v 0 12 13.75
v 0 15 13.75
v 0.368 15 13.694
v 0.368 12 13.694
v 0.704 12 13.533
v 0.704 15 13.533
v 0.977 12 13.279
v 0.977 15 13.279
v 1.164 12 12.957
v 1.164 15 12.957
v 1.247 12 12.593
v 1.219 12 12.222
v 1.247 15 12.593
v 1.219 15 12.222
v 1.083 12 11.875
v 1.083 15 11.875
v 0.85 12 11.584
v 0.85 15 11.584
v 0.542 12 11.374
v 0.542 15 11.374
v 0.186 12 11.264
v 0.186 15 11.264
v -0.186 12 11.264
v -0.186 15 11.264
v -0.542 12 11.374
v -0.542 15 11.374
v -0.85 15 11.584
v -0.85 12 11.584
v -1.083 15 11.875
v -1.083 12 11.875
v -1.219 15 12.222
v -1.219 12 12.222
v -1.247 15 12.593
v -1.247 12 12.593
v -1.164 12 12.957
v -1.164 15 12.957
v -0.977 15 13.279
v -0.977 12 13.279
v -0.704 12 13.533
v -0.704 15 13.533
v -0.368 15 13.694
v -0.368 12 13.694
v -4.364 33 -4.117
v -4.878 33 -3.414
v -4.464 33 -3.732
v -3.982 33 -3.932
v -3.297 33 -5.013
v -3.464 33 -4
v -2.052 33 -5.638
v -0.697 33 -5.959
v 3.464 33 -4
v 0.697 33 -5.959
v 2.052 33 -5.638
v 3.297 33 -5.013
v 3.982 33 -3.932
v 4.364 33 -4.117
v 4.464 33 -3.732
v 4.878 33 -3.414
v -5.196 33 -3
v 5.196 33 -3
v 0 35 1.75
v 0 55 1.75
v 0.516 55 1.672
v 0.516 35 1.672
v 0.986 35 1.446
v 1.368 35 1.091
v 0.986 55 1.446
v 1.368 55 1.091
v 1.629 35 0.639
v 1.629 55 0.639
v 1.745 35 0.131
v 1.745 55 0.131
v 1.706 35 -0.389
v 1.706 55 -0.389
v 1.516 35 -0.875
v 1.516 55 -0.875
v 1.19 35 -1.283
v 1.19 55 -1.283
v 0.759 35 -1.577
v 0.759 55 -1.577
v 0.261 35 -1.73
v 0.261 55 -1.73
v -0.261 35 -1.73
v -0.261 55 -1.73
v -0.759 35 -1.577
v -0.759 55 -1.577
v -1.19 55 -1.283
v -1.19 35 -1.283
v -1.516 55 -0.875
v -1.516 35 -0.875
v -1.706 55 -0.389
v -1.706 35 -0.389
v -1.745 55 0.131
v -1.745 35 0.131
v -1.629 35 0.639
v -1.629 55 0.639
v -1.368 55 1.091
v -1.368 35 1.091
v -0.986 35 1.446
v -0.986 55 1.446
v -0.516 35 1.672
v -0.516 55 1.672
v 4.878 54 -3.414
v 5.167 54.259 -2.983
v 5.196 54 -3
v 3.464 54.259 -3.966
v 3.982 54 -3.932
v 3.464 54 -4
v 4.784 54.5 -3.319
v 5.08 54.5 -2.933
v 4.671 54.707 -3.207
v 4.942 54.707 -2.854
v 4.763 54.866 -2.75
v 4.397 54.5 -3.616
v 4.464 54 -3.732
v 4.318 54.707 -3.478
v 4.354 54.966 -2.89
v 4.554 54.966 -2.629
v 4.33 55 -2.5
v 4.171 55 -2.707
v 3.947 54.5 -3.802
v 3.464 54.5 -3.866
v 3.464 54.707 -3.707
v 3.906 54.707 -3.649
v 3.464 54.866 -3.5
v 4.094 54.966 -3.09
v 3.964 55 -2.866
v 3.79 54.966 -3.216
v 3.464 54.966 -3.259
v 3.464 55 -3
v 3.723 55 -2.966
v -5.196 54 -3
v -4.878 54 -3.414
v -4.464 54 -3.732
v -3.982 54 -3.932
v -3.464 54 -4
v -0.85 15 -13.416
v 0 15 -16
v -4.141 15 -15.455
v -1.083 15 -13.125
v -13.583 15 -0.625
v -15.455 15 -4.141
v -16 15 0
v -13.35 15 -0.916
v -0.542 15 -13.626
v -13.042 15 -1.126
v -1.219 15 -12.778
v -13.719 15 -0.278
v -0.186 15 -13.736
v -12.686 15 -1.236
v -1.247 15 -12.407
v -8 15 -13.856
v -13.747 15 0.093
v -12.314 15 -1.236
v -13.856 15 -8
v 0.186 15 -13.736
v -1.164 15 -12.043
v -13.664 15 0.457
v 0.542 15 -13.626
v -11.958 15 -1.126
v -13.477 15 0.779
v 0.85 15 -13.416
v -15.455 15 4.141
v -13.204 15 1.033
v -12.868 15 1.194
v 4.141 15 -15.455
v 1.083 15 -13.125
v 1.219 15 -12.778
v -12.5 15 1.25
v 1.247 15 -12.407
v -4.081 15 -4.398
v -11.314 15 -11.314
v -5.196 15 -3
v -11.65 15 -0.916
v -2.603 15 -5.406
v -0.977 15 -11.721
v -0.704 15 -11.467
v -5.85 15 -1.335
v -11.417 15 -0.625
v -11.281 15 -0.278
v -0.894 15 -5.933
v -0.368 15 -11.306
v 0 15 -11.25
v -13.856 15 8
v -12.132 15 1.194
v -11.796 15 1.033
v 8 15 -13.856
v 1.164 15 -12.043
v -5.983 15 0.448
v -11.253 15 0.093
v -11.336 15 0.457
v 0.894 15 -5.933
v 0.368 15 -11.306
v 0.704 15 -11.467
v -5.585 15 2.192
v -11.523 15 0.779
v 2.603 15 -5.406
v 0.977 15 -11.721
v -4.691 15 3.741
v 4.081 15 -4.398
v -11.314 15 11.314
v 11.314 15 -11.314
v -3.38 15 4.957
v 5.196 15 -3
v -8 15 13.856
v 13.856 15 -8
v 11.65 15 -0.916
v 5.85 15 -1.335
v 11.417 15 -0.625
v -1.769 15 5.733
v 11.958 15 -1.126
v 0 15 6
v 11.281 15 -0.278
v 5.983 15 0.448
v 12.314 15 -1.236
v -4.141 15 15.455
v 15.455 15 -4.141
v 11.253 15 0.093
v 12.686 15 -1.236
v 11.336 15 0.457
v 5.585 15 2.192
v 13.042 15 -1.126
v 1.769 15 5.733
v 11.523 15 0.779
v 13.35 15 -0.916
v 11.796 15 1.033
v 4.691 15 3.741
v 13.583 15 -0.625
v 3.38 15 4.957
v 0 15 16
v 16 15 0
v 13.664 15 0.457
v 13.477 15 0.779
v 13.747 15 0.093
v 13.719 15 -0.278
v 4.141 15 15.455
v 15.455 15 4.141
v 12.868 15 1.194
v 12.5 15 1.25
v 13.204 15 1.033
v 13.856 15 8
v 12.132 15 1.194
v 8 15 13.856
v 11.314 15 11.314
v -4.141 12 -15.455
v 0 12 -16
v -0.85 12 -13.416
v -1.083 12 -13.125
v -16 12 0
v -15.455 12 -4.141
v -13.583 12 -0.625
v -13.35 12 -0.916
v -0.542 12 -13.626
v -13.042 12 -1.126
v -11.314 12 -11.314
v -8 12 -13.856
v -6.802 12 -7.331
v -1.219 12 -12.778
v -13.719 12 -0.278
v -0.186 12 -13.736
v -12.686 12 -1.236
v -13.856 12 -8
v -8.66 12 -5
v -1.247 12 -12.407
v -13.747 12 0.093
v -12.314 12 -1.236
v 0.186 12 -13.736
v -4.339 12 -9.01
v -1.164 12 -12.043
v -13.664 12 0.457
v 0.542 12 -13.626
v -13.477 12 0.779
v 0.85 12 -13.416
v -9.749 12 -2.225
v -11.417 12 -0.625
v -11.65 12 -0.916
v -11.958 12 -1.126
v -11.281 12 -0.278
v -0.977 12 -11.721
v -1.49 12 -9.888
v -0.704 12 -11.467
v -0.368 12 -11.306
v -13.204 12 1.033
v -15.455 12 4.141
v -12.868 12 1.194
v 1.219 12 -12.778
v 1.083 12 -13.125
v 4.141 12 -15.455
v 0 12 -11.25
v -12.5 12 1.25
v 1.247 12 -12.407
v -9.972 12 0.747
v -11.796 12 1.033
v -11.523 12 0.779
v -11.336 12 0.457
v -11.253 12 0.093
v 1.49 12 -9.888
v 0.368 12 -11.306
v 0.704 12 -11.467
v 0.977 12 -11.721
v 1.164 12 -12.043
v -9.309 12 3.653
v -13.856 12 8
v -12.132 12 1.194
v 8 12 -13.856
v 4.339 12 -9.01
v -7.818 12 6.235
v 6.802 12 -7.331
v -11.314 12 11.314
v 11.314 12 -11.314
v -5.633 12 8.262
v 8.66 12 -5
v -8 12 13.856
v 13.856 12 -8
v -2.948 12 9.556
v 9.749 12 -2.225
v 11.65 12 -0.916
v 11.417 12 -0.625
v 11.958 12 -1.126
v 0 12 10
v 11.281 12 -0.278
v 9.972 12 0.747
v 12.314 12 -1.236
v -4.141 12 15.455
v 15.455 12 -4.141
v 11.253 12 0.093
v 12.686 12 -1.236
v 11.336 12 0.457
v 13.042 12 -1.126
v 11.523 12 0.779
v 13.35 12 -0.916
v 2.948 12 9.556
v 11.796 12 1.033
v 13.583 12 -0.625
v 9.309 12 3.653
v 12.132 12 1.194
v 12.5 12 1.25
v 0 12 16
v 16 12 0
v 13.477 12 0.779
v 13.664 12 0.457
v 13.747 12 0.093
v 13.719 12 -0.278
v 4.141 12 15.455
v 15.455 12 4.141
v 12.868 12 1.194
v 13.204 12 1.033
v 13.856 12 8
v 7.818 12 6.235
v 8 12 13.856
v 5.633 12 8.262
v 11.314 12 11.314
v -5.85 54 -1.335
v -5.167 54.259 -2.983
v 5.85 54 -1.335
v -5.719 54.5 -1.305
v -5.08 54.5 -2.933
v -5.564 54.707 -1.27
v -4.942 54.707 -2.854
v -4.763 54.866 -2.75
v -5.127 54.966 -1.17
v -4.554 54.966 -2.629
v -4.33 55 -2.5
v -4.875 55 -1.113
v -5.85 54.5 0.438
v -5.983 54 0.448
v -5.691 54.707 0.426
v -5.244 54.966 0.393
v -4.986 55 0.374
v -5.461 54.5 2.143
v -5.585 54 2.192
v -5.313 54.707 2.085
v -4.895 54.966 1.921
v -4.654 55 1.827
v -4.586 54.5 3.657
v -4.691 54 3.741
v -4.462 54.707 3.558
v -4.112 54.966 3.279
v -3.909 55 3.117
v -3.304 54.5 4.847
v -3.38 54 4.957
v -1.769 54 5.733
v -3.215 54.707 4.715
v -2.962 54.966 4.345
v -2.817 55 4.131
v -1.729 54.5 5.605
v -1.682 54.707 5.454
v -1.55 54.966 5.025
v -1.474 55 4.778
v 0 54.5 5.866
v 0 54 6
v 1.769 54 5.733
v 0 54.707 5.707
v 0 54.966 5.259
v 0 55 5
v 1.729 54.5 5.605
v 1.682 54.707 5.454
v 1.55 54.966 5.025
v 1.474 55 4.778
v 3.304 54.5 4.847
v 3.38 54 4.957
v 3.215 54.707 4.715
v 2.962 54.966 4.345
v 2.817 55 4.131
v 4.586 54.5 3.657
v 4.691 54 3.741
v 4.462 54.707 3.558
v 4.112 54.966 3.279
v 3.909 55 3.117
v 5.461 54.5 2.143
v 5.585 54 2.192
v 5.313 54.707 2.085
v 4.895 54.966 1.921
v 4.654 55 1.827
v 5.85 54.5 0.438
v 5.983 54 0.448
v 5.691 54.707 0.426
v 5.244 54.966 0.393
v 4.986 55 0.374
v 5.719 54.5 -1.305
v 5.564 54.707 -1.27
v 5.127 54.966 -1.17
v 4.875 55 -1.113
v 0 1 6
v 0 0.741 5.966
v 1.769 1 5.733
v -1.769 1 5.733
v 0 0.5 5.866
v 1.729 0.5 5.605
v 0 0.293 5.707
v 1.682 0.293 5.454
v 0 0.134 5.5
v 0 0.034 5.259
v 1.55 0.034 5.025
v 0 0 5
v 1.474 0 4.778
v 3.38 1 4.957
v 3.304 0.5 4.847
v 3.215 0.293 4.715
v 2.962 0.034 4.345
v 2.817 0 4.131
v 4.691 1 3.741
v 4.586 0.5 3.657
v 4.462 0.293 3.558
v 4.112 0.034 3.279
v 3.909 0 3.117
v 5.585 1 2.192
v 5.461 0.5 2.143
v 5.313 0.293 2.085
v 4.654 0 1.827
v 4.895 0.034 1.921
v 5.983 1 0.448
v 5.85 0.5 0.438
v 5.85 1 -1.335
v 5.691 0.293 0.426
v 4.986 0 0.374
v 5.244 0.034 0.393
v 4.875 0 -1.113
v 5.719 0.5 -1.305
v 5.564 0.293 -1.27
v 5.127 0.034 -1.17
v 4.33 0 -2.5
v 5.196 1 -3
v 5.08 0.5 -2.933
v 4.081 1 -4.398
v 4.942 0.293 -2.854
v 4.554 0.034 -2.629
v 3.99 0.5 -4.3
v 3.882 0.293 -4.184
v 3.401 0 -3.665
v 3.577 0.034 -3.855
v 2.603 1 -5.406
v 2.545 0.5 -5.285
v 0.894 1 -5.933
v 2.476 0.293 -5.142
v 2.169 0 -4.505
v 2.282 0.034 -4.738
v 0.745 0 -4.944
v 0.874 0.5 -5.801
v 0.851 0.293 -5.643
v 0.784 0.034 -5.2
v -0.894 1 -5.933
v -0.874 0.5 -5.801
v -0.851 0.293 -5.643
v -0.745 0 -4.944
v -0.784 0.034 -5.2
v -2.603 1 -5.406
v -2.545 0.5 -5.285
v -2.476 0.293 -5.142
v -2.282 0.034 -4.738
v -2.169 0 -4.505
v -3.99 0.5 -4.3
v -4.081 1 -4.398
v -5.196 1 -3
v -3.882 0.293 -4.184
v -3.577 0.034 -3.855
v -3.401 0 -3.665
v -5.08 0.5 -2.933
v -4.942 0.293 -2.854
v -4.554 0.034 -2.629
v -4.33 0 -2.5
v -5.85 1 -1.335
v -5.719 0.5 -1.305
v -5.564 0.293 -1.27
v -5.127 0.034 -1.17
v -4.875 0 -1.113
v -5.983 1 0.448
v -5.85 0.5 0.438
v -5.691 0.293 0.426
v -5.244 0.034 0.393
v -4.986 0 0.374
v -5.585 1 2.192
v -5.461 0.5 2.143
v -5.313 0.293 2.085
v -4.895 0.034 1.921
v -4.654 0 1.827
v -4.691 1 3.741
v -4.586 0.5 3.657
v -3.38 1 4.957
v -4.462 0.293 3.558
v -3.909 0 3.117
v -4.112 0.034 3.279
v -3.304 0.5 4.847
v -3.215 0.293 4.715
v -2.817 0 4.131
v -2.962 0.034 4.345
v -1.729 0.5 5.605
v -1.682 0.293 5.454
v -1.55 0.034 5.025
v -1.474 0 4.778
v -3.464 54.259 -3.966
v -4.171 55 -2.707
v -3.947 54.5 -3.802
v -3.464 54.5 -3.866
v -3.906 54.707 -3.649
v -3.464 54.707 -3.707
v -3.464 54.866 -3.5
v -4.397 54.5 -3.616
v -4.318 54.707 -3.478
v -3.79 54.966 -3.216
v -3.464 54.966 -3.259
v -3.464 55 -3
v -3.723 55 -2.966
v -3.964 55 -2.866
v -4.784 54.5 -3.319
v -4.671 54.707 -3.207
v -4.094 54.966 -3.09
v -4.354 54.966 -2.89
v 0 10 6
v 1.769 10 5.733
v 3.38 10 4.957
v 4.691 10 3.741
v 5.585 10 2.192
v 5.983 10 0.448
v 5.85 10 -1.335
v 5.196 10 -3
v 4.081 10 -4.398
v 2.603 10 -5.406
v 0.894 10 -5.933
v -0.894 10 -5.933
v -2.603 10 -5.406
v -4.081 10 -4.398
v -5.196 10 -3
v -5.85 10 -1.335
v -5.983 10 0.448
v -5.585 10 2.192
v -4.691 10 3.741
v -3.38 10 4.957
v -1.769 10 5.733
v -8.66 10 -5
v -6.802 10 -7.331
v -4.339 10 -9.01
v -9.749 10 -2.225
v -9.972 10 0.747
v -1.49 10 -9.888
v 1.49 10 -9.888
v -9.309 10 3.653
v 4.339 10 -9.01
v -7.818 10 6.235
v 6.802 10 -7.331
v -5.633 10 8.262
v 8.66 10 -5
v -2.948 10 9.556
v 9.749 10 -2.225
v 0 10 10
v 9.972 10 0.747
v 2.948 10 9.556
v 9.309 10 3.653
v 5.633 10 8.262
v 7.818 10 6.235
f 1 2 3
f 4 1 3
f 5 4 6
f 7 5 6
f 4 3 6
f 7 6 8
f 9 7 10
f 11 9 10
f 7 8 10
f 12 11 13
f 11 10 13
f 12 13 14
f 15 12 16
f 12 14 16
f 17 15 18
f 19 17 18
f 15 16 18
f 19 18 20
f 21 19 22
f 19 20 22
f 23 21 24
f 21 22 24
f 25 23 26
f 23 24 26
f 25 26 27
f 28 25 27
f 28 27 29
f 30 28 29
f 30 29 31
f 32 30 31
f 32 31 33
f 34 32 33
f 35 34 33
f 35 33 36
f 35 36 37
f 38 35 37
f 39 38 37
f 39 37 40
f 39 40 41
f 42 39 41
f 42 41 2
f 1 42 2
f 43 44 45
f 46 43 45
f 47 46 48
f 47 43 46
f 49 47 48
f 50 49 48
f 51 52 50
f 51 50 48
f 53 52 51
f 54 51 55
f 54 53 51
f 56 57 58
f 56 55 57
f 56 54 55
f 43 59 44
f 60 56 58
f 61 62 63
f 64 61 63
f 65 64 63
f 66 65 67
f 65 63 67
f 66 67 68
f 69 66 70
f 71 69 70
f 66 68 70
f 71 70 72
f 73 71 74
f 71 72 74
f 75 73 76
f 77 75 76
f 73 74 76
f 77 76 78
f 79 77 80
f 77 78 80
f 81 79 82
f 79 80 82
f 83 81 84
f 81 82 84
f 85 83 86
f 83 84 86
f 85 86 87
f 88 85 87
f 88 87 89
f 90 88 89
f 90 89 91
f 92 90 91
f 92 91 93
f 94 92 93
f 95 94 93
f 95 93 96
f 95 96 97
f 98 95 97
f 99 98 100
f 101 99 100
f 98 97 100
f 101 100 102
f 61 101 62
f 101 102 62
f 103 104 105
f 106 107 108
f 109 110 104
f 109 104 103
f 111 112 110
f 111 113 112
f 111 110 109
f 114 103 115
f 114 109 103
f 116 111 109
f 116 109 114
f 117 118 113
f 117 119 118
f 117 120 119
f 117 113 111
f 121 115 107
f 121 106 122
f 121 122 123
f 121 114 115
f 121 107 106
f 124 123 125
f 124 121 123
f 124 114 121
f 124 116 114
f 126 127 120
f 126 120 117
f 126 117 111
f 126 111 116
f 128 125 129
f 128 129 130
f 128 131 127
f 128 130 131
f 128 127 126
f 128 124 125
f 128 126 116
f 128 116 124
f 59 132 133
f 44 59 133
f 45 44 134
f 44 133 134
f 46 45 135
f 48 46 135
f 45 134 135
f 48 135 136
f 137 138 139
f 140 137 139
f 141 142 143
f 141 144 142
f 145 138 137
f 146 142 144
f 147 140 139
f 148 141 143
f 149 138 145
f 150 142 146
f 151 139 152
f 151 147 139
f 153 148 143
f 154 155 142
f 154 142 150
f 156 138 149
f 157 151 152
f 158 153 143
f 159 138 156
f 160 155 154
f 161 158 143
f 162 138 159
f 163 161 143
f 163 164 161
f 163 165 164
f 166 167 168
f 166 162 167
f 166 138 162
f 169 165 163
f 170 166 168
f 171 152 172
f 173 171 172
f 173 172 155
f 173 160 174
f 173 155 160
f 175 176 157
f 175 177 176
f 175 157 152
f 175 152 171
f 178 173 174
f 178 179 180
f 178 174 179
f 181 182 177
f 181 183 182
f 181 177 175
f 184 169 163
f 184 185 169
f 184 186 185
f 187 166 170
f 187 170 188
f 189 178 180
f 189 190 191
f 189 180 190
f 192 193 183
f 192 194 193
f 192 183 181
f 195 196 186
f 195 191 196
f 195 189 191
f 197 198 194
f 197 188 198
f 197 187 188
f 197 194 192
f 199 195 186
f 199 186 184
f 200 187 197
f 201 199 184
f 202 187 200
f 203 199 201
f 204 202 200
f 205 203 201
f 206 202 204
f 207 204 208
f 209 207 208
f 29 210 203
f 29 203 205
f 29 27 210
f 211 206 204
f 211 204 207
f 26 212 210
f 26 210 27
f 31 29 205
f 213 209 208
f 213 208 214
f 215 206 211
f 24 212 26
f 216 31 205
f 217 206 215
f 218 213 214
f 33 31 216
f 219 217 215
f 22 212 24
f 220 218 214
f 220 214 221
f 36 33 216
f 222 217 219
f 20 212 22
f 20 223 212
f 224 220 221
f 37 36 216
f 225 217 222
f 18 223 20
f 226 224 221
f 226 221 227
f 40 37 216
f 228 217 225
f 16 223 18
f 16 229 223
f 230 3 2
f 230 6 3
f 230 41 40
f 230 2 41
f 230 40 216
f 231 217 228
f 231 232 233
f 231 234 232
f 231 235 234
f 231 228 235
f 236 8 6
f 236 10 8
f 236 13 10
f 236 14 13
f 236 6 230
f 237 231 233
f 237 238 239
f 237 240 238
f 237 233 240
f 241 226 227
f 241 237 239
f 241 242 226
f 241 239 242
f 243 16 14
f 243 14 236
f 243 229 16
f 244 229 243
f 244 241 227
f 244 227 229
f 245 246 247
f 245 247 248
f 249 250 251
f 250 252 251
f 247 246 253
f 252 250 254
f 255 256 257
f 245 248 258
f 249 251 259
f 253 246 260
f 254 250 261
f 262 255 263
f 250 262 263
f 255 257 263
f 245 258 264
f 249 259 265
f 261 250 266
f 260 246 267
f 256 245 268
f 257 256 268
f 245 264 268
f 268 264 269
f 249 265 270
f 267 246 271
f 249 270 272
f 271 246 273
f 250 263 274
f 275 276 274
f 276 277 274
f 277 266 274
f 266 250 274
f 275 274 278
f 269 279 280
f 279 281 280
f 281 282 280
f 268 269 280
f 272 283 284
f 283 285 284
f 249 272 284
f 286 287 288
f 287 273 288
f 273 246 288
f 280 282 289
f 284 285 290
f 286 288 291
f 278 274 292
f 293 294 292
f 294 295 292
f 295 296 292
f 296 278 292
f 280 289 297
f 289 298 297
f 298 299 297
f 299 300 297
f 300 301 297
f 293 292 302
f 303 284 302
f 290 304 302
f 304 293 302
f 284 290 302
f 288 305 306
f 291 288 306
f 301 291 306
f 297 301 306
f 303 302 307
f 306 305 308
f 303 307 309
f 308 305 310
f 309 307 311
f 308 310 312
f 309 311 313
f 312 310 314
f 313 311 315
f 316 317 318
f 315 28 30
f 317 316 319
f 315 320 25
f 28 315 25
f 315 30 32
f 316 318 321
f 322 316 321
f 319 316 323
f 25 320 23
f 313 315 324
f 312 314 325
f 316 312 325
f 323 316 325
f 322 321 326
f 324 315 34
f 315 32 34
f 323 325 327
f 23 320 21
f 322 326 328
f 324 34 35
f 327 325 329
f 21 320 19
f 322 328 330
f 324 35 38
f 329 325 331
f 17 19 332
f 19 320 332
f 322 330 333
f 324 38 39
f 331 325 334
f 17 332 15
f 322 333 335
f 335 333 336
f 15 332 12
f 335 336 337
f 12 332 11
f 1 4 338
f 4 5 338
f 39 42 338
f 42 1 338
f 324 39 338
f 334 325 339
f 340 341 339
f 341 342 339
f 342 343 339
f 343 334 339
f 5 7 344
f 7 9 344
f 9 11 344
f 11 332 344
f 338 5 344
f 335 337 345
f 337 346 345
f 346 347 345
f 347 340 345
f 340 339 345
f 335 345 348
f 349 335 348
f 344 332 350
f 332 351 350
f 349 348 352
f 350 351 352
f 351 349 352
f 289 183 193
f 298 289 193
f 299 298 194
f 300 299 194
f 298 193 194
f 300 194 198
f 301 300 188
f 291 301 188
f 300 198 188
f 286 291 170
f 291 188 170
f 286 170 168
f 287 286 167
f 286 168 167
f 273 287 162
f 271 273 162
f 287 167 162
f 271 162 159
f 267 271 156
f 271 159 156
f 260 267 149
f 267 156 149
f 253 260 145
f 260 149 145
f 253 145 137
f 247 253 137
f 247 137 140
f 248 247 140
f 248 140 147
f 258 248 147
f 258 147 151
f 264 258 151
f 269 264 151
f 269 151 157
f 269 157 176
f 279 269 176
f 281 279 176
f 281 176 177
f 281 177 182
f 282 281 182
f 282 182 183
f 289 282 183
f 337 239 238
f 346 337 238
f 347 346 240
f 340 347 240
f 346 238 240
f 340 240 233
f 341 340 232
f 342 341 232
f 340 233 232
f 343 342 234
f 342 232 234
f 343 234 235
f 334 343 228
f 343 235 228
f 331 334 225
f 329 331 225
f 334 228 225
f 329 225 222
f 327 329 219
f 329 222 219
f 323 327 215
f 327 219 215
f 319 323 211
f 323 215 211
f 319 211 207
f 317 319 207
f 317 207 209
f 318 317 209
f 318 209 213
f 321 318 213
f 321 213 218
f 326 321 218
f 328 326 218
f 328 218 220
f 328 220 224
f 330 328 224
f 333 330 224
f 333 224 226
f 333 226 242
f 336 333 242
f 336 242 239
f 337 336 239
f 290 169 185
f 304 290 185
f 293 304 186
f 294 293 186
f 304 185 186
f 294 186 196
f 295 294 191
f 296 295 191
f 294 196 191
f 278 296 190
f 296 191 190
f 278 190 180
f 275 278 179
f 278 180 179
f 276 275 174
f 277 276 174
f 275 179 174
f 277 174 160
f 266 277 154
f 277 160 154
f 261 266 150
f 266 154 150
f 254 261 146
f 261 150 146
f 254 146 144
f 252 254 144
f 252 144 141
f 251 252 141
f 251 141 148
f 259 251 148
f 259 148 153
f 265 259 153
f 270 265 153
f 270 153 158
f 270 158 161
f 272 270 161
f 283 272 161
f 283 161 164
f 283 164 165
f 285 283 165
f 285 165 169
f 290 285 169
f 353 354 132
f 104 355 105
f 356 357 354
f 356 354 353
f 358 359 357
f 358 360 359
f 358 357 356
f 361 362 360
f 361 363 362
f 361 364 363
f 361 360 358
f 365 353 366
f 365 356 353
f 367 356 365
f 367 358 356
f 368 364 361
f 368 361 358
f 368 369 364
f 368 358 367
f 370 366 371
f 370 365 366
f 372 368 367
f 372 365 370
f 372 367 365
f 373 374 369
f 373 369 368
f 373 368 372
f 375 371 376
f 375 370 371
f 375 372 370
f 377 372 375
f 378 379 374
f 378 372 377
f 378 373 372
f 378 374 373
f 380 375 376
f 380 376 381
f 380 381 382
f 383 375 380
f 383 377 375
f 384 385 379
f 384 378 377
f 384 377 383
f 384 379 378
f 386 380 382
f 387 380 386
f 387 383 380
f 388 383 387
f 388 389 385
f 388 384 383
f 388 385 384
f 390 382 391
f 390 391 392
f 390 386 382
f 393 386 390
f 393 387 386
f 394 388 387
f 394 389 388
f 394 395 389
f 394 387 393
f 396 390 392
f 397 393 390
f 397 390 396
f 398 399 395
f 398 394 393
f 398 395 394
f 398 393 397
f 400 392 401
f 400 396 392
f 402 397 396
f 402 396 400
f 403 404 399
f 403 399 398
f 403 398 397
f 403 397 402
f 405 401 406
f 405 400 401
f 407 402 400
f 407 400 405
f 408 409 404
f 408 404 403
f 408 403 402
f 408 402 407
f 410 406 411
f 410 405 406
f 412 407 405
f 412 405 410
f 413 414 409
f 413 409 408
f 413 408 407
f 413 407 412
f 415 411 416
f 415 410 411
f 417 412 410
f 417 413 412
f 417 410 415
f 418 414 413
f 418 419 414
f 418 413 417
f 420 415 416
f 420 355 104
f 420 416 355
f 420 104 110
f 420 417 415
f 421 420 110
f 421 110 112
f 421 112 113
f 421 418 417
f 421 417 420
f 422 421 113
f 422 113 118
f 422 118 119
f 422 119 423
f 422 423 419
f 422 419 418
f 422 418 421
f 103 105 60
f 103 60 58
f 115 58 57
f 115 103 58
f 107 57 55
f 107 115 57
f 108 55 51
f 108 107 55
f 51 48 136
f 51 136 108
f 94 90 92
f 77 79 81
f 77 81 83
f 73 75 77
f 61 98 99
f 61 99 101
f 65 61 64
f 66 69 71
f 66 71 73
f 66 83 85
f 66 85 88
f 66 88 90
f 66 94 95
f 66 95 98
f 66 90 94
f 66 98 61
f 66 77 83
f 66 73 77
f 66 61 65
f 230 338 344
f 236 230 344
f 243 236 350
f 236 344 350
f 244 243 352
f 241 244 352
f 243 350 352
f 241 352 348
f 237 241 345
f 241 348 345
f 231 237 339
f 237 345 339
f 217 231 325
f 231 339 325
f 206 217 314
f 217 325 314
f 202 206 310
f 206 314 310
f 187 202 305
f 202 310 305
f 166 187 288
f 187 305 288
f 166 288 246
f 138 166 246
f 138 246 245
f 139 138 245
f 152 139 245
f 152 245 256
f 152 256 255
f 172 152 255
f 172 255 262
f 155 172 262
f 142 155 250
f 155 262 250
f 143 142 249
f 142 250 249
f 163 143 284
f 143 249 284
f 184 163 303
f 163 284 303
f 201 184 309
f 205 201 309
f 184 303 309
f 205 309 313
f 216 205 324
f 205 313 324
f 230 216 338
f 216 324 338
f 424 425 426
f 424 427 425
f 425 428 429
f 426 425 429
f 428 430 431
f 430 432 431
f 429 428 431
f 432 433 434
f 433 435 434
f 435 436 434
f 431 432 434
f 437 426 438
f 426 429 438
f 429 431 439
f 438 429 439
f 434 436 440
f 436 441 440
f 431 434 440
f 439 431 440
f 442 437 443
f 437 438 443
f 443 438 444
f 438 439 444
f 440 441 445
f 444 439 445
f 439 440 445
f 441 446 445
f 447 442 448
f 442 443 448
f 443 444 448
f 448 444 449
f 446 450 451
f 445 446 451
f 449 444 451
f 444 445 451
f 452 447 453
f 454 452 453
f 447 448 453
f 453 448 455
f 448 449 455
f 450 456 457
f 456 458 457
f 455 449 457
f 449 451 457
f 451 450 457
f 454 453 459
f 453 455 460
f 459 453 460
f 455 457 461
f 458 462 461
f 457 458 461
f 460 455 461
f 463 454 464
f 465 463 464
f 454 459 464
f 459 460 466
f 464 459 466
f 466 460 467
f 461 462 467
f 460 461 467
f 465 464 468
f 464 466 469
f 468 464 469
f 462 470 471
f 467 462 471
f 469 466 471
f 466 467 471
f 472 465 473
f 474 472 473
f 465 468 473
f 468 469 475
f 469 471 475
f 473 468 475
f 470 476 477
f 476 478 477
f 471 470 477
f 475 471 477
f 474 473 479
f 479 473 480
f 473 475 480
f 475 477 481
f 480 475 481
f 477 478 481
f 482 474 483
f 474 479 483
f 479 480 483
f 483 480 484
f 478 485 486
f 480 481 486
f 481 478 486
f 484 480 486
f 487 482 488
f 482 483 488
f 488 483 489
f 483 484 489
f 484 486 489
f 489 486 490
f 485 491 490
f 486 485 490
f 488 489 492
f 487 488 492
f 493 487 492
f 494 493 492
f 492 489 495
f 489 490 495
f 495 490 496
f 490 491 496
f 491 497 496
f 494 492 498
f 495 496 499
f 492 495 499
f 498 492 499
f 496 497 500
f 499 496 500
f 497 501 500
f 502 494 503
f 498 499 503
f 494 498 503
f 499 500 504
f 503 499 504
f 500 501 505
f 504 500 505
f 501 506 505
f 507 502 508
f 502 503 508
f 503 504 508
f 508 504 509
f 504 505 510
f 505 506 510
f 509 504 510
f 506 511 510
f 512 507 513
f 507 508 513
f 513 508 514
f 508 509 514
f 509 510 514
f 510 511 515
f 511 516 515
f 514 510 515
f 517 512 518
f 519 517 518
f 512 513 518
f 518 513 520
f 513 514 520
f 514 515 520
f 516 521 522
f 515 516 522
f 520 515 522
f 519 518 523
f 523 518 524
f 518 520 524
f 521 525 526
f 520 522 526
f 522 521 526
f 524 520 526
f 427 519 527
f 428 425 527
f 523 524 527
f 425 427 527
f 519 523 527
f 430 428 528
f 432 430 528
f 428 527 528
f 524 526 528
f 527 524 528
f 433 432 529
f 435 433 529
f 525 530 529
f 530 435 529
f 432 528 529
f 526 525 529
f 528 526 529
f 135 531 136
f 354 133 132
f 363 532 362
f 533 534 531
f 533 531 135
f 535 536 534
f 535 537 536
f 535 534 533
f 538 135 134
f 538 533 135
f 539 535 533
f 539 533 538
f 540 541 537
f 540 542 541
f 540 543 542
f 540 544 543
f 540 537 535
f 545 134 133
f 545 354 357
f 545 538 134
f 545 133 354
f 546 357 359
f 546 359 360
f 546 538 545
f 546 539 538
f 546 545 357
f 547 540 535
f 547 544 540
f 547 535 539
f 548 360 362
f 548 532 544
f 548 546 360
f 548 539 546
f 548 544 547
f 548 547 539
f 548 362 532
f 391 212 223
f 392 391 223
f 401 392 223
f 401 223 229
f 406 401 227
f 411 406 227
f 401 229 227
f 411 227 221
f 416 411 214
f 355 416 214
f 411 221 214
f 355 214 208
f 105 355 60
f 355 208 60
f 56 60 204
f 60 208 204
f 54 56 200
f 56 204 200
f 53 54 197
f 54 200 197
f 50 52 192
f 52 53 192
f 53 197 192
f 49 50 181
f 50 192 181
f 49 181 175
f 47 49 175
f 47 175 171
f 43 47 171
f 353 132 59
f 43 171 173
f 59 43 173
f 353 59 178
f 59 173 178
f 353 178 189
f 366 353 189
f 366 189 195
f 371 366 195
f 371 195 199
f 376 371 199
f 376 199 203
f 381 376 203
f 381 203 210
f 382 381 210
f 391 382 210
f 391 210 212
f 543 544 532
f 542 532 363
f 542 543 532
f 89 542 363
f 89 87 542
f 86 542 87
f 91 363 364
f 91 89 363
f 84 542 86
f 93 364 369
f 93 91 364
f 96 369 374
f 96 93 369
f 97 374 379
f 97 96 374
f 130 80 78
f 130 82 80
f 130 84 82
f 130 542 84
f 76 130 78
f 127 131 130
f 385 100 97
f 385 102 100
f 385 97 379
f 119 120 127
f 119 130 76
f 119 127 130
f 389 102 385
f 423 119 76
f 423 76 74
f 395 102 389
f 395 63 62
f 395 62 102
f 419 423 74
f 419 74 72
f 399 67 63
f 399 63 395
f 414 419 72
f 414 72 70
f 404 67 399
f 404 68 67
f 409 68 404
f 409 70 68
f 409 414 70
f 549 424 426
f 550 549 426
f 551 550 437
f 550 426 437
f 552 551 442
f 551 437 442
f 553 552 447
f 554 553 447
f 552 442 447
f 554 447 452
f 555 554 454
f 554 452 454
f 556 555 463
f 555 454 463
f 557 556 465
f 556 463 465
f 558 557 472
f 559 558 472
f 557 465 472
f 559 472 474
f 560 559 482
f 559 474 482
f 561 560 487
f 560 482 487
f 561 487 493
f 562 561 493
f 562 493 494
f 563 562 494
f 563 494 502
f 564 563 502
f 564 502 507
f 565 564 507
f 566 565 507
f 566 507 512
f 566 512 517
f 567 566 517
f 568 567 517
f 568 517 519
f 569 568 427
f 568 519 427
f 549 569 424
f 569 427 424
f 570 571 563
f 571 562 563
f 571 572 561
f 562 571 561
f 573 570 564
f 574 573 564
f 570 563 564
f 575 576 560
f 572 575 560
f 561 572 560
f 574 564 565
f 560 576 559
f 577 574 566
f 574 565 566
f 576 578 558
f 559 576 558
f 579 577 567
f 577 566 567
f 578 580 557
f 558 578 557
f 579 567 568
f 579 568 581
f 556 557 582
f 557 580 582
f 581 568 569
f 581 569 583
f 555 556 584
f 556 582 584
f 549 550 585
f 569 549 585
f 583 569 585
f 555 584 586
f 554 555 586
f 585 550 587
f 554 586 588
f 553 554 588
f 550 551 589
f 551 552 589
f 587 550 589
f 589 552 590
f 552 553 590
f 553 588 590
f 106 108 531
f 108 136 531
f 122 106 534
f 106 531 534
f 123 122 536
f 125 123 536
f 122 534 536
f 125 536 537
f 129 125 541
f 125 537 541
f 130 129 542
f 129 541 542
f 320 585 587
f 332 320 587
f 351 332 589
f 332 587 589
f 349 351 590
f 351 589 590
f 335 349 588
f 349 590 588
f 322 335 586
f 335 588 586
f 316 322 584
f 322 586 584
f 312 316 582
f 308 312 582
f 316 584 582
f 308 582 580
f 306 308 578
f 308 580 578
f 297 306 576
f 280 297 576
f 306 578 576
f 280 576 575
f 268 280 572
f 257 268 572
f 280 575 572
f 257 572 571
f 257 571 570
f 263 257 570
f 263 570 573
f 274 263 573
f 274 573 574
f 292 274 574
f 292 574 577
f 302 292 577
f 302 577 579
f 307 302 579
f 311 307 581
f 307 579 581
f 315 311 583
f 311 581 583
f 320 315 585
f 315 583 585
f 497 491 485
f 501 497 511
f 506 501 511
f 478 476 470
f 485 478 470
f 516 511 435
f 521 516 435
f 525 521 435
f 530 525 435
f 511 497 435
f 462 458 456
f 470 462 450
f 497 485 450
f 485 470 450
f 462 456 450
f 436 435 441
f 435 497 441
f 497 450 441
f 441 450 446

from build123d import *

# Parameters (mm, degrees)
SKETCH1_R           = 6
BOSS_EXTRUDE1_DEPTH = 10
SKETCH2_R           = 10
BOSS_EXTRUDE2_DEPTH = 2
SKETCH5_R           = 16
BOSS_EXTRUDE3_DEPTH = 3
SKETCH6_R           = 6
BOSS_EXTRUDE4_DEPTH = 40
FILLET1_R           = 1
CUT_EXTRUDE1_START  = -22
CUT_EXTRUDE1_DEPTH  = 22
FILLET2_R           = 2
FILLET3_R           = 1
SKETCH10_R          = 1.75
CUT_EXTRUDE2_DEPTH  = 20
SKETCH11_R          = 1.25
CUT_EXTRUDE3_DEPTH  = 7


with BuildPart() as part:
    # Sketch1 → Boss-Extrude1 (new body)
    with BuildSketch(Plane(origin=(0, 0, 0), x_dir=(1, 0, 0), z_dir=(0, 1, 0))):
        with Locations(Location((0, 0, 0), (0, 0, 270))):
            Circle(SKETCH1_R)
    extrude(amount=BOSS_EXTRUDE1_DEPTH)

    # Sketch2 → Boss-Extrude2 (add)
    with BuildSketch(Plane(origin=(0, 10, 0), x_dir=(1, 0, 0), z_dir=(0, 1, 0))):
        with Locations(Location((0, 0, 0), (0, 0, 270))):
            Circle(SKETCH2_R)
    extrude(amount=BOSS_EXTRUDE2_DEPTH)

    # Sketch5 → Boss-Extrude3 (add)
    with BuildSketch(Plane(origin=(0, 12, 0), x_dir=(1, 0, 0), z_dir=(0, 1, 0))):
        with Locations(Location((0, 0, 0), (0, 0, 270))):
            Circle(SKETCH5_R)
    extrude(amount=BOSS_EXTRUDE3_DEPTH)

    # Sketch6 → Boss-Extrude4 (add)
    with BuildSketch(Plane(origin=(0, 15, 0), x_dir=(1, 0, 0), z_dir=(0, 1, 0))):
        with Locations(Location((0, 0, 0), (0, 0, 270))):
            Circle(SKETCH6_R)
    extrude(amount=BOSS_EXTRUDE4_DEPTH)

    # Fillet1
    fillet1_edges = [part.edges().sort_by_distance(p)[0] for p in [
        (0, 0, -6),
    ]]
    fillet(fillet1_edges, radius=FILLET1_R)

    # Sketch7 → Cut-Extrude1 (cut)
    with BuildSketch(Plane(origin=(0, 55, 0), x_dir=(1, 0, 0), z_dir=(0, 1, 0)).offset(CUT_EXTRUDE1_START)):
        with BuildLine():
            Line((-4.472135955, 4), (4.472135955, 4))
            ThreePointArc((4.472135955, 4), (0, 6), (-4.472135955, 4))
        make_face()
    extrude(amount=CUT_EXTRUDE1_DEPTH, mode=Mode.SUBTRACT)

    # Fillet2
    fillet2_edges = [part.edges().sort_by_distance(p)[0] for p in [
        (-4.472135955, 44, -4),
        (4.472135955, 44, -4),
    ]]
    fillet(fillet2_edges, radius=FILLET2_R)

    # Fillet3
    fillet3_edges = [part.edges().sort_by_distance(p)[0] for p in [
        (5.196152423, 55, 3),
        (0, 55, -4),
        (-4.464101615, 55, -3.732050808),
        (4.464101615, 55, -3.732050808),
    ]]
    fillet(fillet3_edges, radius=FILLET3_R)

    # Sketch10 → Cut-Extrude2 (cut)
    with BuildSketch(Plane(origin=(0, 55, 0), x_dir=(1, 0, 0), z_dir=(0, 1, 0))):
        with Locations(Location((0, 0, 0), (0, 0, 270))):
            Circle(SKETCH10_R)
    extrude(amount=-CUT_EXTRUDE2_DEPTH, mode=Mode.SUBTRACT)

    # Sketch11 → Cut-Extrude3 (cut)
    with BuildSketch(Plane(origin=(0, 15, 0), x_dir=(1, 0, 0), z_dir=(0, 1, 0))):
        with Locations(Location((0, 12.5, 0), (0, 0, 270))):
            Circle(SKETCH11_R)
        with Locations(Location((12.5, 0, 0), (0, 0, 270))):
            Circle(SKETCH11_R)
        with Locations(Location((0, -12.5, 0), (0, 0, 270))):
            Circle(SKETCH11_R)
        with Locations(Location((-12.5, 0, 0), (0, 0, 270))):
            Circle(SKETCH11_R)
    extrude(amount=-CUT_EXTRUDE3_DEPTH, mode=Mode.SUBTRACT)


solid = part.part
